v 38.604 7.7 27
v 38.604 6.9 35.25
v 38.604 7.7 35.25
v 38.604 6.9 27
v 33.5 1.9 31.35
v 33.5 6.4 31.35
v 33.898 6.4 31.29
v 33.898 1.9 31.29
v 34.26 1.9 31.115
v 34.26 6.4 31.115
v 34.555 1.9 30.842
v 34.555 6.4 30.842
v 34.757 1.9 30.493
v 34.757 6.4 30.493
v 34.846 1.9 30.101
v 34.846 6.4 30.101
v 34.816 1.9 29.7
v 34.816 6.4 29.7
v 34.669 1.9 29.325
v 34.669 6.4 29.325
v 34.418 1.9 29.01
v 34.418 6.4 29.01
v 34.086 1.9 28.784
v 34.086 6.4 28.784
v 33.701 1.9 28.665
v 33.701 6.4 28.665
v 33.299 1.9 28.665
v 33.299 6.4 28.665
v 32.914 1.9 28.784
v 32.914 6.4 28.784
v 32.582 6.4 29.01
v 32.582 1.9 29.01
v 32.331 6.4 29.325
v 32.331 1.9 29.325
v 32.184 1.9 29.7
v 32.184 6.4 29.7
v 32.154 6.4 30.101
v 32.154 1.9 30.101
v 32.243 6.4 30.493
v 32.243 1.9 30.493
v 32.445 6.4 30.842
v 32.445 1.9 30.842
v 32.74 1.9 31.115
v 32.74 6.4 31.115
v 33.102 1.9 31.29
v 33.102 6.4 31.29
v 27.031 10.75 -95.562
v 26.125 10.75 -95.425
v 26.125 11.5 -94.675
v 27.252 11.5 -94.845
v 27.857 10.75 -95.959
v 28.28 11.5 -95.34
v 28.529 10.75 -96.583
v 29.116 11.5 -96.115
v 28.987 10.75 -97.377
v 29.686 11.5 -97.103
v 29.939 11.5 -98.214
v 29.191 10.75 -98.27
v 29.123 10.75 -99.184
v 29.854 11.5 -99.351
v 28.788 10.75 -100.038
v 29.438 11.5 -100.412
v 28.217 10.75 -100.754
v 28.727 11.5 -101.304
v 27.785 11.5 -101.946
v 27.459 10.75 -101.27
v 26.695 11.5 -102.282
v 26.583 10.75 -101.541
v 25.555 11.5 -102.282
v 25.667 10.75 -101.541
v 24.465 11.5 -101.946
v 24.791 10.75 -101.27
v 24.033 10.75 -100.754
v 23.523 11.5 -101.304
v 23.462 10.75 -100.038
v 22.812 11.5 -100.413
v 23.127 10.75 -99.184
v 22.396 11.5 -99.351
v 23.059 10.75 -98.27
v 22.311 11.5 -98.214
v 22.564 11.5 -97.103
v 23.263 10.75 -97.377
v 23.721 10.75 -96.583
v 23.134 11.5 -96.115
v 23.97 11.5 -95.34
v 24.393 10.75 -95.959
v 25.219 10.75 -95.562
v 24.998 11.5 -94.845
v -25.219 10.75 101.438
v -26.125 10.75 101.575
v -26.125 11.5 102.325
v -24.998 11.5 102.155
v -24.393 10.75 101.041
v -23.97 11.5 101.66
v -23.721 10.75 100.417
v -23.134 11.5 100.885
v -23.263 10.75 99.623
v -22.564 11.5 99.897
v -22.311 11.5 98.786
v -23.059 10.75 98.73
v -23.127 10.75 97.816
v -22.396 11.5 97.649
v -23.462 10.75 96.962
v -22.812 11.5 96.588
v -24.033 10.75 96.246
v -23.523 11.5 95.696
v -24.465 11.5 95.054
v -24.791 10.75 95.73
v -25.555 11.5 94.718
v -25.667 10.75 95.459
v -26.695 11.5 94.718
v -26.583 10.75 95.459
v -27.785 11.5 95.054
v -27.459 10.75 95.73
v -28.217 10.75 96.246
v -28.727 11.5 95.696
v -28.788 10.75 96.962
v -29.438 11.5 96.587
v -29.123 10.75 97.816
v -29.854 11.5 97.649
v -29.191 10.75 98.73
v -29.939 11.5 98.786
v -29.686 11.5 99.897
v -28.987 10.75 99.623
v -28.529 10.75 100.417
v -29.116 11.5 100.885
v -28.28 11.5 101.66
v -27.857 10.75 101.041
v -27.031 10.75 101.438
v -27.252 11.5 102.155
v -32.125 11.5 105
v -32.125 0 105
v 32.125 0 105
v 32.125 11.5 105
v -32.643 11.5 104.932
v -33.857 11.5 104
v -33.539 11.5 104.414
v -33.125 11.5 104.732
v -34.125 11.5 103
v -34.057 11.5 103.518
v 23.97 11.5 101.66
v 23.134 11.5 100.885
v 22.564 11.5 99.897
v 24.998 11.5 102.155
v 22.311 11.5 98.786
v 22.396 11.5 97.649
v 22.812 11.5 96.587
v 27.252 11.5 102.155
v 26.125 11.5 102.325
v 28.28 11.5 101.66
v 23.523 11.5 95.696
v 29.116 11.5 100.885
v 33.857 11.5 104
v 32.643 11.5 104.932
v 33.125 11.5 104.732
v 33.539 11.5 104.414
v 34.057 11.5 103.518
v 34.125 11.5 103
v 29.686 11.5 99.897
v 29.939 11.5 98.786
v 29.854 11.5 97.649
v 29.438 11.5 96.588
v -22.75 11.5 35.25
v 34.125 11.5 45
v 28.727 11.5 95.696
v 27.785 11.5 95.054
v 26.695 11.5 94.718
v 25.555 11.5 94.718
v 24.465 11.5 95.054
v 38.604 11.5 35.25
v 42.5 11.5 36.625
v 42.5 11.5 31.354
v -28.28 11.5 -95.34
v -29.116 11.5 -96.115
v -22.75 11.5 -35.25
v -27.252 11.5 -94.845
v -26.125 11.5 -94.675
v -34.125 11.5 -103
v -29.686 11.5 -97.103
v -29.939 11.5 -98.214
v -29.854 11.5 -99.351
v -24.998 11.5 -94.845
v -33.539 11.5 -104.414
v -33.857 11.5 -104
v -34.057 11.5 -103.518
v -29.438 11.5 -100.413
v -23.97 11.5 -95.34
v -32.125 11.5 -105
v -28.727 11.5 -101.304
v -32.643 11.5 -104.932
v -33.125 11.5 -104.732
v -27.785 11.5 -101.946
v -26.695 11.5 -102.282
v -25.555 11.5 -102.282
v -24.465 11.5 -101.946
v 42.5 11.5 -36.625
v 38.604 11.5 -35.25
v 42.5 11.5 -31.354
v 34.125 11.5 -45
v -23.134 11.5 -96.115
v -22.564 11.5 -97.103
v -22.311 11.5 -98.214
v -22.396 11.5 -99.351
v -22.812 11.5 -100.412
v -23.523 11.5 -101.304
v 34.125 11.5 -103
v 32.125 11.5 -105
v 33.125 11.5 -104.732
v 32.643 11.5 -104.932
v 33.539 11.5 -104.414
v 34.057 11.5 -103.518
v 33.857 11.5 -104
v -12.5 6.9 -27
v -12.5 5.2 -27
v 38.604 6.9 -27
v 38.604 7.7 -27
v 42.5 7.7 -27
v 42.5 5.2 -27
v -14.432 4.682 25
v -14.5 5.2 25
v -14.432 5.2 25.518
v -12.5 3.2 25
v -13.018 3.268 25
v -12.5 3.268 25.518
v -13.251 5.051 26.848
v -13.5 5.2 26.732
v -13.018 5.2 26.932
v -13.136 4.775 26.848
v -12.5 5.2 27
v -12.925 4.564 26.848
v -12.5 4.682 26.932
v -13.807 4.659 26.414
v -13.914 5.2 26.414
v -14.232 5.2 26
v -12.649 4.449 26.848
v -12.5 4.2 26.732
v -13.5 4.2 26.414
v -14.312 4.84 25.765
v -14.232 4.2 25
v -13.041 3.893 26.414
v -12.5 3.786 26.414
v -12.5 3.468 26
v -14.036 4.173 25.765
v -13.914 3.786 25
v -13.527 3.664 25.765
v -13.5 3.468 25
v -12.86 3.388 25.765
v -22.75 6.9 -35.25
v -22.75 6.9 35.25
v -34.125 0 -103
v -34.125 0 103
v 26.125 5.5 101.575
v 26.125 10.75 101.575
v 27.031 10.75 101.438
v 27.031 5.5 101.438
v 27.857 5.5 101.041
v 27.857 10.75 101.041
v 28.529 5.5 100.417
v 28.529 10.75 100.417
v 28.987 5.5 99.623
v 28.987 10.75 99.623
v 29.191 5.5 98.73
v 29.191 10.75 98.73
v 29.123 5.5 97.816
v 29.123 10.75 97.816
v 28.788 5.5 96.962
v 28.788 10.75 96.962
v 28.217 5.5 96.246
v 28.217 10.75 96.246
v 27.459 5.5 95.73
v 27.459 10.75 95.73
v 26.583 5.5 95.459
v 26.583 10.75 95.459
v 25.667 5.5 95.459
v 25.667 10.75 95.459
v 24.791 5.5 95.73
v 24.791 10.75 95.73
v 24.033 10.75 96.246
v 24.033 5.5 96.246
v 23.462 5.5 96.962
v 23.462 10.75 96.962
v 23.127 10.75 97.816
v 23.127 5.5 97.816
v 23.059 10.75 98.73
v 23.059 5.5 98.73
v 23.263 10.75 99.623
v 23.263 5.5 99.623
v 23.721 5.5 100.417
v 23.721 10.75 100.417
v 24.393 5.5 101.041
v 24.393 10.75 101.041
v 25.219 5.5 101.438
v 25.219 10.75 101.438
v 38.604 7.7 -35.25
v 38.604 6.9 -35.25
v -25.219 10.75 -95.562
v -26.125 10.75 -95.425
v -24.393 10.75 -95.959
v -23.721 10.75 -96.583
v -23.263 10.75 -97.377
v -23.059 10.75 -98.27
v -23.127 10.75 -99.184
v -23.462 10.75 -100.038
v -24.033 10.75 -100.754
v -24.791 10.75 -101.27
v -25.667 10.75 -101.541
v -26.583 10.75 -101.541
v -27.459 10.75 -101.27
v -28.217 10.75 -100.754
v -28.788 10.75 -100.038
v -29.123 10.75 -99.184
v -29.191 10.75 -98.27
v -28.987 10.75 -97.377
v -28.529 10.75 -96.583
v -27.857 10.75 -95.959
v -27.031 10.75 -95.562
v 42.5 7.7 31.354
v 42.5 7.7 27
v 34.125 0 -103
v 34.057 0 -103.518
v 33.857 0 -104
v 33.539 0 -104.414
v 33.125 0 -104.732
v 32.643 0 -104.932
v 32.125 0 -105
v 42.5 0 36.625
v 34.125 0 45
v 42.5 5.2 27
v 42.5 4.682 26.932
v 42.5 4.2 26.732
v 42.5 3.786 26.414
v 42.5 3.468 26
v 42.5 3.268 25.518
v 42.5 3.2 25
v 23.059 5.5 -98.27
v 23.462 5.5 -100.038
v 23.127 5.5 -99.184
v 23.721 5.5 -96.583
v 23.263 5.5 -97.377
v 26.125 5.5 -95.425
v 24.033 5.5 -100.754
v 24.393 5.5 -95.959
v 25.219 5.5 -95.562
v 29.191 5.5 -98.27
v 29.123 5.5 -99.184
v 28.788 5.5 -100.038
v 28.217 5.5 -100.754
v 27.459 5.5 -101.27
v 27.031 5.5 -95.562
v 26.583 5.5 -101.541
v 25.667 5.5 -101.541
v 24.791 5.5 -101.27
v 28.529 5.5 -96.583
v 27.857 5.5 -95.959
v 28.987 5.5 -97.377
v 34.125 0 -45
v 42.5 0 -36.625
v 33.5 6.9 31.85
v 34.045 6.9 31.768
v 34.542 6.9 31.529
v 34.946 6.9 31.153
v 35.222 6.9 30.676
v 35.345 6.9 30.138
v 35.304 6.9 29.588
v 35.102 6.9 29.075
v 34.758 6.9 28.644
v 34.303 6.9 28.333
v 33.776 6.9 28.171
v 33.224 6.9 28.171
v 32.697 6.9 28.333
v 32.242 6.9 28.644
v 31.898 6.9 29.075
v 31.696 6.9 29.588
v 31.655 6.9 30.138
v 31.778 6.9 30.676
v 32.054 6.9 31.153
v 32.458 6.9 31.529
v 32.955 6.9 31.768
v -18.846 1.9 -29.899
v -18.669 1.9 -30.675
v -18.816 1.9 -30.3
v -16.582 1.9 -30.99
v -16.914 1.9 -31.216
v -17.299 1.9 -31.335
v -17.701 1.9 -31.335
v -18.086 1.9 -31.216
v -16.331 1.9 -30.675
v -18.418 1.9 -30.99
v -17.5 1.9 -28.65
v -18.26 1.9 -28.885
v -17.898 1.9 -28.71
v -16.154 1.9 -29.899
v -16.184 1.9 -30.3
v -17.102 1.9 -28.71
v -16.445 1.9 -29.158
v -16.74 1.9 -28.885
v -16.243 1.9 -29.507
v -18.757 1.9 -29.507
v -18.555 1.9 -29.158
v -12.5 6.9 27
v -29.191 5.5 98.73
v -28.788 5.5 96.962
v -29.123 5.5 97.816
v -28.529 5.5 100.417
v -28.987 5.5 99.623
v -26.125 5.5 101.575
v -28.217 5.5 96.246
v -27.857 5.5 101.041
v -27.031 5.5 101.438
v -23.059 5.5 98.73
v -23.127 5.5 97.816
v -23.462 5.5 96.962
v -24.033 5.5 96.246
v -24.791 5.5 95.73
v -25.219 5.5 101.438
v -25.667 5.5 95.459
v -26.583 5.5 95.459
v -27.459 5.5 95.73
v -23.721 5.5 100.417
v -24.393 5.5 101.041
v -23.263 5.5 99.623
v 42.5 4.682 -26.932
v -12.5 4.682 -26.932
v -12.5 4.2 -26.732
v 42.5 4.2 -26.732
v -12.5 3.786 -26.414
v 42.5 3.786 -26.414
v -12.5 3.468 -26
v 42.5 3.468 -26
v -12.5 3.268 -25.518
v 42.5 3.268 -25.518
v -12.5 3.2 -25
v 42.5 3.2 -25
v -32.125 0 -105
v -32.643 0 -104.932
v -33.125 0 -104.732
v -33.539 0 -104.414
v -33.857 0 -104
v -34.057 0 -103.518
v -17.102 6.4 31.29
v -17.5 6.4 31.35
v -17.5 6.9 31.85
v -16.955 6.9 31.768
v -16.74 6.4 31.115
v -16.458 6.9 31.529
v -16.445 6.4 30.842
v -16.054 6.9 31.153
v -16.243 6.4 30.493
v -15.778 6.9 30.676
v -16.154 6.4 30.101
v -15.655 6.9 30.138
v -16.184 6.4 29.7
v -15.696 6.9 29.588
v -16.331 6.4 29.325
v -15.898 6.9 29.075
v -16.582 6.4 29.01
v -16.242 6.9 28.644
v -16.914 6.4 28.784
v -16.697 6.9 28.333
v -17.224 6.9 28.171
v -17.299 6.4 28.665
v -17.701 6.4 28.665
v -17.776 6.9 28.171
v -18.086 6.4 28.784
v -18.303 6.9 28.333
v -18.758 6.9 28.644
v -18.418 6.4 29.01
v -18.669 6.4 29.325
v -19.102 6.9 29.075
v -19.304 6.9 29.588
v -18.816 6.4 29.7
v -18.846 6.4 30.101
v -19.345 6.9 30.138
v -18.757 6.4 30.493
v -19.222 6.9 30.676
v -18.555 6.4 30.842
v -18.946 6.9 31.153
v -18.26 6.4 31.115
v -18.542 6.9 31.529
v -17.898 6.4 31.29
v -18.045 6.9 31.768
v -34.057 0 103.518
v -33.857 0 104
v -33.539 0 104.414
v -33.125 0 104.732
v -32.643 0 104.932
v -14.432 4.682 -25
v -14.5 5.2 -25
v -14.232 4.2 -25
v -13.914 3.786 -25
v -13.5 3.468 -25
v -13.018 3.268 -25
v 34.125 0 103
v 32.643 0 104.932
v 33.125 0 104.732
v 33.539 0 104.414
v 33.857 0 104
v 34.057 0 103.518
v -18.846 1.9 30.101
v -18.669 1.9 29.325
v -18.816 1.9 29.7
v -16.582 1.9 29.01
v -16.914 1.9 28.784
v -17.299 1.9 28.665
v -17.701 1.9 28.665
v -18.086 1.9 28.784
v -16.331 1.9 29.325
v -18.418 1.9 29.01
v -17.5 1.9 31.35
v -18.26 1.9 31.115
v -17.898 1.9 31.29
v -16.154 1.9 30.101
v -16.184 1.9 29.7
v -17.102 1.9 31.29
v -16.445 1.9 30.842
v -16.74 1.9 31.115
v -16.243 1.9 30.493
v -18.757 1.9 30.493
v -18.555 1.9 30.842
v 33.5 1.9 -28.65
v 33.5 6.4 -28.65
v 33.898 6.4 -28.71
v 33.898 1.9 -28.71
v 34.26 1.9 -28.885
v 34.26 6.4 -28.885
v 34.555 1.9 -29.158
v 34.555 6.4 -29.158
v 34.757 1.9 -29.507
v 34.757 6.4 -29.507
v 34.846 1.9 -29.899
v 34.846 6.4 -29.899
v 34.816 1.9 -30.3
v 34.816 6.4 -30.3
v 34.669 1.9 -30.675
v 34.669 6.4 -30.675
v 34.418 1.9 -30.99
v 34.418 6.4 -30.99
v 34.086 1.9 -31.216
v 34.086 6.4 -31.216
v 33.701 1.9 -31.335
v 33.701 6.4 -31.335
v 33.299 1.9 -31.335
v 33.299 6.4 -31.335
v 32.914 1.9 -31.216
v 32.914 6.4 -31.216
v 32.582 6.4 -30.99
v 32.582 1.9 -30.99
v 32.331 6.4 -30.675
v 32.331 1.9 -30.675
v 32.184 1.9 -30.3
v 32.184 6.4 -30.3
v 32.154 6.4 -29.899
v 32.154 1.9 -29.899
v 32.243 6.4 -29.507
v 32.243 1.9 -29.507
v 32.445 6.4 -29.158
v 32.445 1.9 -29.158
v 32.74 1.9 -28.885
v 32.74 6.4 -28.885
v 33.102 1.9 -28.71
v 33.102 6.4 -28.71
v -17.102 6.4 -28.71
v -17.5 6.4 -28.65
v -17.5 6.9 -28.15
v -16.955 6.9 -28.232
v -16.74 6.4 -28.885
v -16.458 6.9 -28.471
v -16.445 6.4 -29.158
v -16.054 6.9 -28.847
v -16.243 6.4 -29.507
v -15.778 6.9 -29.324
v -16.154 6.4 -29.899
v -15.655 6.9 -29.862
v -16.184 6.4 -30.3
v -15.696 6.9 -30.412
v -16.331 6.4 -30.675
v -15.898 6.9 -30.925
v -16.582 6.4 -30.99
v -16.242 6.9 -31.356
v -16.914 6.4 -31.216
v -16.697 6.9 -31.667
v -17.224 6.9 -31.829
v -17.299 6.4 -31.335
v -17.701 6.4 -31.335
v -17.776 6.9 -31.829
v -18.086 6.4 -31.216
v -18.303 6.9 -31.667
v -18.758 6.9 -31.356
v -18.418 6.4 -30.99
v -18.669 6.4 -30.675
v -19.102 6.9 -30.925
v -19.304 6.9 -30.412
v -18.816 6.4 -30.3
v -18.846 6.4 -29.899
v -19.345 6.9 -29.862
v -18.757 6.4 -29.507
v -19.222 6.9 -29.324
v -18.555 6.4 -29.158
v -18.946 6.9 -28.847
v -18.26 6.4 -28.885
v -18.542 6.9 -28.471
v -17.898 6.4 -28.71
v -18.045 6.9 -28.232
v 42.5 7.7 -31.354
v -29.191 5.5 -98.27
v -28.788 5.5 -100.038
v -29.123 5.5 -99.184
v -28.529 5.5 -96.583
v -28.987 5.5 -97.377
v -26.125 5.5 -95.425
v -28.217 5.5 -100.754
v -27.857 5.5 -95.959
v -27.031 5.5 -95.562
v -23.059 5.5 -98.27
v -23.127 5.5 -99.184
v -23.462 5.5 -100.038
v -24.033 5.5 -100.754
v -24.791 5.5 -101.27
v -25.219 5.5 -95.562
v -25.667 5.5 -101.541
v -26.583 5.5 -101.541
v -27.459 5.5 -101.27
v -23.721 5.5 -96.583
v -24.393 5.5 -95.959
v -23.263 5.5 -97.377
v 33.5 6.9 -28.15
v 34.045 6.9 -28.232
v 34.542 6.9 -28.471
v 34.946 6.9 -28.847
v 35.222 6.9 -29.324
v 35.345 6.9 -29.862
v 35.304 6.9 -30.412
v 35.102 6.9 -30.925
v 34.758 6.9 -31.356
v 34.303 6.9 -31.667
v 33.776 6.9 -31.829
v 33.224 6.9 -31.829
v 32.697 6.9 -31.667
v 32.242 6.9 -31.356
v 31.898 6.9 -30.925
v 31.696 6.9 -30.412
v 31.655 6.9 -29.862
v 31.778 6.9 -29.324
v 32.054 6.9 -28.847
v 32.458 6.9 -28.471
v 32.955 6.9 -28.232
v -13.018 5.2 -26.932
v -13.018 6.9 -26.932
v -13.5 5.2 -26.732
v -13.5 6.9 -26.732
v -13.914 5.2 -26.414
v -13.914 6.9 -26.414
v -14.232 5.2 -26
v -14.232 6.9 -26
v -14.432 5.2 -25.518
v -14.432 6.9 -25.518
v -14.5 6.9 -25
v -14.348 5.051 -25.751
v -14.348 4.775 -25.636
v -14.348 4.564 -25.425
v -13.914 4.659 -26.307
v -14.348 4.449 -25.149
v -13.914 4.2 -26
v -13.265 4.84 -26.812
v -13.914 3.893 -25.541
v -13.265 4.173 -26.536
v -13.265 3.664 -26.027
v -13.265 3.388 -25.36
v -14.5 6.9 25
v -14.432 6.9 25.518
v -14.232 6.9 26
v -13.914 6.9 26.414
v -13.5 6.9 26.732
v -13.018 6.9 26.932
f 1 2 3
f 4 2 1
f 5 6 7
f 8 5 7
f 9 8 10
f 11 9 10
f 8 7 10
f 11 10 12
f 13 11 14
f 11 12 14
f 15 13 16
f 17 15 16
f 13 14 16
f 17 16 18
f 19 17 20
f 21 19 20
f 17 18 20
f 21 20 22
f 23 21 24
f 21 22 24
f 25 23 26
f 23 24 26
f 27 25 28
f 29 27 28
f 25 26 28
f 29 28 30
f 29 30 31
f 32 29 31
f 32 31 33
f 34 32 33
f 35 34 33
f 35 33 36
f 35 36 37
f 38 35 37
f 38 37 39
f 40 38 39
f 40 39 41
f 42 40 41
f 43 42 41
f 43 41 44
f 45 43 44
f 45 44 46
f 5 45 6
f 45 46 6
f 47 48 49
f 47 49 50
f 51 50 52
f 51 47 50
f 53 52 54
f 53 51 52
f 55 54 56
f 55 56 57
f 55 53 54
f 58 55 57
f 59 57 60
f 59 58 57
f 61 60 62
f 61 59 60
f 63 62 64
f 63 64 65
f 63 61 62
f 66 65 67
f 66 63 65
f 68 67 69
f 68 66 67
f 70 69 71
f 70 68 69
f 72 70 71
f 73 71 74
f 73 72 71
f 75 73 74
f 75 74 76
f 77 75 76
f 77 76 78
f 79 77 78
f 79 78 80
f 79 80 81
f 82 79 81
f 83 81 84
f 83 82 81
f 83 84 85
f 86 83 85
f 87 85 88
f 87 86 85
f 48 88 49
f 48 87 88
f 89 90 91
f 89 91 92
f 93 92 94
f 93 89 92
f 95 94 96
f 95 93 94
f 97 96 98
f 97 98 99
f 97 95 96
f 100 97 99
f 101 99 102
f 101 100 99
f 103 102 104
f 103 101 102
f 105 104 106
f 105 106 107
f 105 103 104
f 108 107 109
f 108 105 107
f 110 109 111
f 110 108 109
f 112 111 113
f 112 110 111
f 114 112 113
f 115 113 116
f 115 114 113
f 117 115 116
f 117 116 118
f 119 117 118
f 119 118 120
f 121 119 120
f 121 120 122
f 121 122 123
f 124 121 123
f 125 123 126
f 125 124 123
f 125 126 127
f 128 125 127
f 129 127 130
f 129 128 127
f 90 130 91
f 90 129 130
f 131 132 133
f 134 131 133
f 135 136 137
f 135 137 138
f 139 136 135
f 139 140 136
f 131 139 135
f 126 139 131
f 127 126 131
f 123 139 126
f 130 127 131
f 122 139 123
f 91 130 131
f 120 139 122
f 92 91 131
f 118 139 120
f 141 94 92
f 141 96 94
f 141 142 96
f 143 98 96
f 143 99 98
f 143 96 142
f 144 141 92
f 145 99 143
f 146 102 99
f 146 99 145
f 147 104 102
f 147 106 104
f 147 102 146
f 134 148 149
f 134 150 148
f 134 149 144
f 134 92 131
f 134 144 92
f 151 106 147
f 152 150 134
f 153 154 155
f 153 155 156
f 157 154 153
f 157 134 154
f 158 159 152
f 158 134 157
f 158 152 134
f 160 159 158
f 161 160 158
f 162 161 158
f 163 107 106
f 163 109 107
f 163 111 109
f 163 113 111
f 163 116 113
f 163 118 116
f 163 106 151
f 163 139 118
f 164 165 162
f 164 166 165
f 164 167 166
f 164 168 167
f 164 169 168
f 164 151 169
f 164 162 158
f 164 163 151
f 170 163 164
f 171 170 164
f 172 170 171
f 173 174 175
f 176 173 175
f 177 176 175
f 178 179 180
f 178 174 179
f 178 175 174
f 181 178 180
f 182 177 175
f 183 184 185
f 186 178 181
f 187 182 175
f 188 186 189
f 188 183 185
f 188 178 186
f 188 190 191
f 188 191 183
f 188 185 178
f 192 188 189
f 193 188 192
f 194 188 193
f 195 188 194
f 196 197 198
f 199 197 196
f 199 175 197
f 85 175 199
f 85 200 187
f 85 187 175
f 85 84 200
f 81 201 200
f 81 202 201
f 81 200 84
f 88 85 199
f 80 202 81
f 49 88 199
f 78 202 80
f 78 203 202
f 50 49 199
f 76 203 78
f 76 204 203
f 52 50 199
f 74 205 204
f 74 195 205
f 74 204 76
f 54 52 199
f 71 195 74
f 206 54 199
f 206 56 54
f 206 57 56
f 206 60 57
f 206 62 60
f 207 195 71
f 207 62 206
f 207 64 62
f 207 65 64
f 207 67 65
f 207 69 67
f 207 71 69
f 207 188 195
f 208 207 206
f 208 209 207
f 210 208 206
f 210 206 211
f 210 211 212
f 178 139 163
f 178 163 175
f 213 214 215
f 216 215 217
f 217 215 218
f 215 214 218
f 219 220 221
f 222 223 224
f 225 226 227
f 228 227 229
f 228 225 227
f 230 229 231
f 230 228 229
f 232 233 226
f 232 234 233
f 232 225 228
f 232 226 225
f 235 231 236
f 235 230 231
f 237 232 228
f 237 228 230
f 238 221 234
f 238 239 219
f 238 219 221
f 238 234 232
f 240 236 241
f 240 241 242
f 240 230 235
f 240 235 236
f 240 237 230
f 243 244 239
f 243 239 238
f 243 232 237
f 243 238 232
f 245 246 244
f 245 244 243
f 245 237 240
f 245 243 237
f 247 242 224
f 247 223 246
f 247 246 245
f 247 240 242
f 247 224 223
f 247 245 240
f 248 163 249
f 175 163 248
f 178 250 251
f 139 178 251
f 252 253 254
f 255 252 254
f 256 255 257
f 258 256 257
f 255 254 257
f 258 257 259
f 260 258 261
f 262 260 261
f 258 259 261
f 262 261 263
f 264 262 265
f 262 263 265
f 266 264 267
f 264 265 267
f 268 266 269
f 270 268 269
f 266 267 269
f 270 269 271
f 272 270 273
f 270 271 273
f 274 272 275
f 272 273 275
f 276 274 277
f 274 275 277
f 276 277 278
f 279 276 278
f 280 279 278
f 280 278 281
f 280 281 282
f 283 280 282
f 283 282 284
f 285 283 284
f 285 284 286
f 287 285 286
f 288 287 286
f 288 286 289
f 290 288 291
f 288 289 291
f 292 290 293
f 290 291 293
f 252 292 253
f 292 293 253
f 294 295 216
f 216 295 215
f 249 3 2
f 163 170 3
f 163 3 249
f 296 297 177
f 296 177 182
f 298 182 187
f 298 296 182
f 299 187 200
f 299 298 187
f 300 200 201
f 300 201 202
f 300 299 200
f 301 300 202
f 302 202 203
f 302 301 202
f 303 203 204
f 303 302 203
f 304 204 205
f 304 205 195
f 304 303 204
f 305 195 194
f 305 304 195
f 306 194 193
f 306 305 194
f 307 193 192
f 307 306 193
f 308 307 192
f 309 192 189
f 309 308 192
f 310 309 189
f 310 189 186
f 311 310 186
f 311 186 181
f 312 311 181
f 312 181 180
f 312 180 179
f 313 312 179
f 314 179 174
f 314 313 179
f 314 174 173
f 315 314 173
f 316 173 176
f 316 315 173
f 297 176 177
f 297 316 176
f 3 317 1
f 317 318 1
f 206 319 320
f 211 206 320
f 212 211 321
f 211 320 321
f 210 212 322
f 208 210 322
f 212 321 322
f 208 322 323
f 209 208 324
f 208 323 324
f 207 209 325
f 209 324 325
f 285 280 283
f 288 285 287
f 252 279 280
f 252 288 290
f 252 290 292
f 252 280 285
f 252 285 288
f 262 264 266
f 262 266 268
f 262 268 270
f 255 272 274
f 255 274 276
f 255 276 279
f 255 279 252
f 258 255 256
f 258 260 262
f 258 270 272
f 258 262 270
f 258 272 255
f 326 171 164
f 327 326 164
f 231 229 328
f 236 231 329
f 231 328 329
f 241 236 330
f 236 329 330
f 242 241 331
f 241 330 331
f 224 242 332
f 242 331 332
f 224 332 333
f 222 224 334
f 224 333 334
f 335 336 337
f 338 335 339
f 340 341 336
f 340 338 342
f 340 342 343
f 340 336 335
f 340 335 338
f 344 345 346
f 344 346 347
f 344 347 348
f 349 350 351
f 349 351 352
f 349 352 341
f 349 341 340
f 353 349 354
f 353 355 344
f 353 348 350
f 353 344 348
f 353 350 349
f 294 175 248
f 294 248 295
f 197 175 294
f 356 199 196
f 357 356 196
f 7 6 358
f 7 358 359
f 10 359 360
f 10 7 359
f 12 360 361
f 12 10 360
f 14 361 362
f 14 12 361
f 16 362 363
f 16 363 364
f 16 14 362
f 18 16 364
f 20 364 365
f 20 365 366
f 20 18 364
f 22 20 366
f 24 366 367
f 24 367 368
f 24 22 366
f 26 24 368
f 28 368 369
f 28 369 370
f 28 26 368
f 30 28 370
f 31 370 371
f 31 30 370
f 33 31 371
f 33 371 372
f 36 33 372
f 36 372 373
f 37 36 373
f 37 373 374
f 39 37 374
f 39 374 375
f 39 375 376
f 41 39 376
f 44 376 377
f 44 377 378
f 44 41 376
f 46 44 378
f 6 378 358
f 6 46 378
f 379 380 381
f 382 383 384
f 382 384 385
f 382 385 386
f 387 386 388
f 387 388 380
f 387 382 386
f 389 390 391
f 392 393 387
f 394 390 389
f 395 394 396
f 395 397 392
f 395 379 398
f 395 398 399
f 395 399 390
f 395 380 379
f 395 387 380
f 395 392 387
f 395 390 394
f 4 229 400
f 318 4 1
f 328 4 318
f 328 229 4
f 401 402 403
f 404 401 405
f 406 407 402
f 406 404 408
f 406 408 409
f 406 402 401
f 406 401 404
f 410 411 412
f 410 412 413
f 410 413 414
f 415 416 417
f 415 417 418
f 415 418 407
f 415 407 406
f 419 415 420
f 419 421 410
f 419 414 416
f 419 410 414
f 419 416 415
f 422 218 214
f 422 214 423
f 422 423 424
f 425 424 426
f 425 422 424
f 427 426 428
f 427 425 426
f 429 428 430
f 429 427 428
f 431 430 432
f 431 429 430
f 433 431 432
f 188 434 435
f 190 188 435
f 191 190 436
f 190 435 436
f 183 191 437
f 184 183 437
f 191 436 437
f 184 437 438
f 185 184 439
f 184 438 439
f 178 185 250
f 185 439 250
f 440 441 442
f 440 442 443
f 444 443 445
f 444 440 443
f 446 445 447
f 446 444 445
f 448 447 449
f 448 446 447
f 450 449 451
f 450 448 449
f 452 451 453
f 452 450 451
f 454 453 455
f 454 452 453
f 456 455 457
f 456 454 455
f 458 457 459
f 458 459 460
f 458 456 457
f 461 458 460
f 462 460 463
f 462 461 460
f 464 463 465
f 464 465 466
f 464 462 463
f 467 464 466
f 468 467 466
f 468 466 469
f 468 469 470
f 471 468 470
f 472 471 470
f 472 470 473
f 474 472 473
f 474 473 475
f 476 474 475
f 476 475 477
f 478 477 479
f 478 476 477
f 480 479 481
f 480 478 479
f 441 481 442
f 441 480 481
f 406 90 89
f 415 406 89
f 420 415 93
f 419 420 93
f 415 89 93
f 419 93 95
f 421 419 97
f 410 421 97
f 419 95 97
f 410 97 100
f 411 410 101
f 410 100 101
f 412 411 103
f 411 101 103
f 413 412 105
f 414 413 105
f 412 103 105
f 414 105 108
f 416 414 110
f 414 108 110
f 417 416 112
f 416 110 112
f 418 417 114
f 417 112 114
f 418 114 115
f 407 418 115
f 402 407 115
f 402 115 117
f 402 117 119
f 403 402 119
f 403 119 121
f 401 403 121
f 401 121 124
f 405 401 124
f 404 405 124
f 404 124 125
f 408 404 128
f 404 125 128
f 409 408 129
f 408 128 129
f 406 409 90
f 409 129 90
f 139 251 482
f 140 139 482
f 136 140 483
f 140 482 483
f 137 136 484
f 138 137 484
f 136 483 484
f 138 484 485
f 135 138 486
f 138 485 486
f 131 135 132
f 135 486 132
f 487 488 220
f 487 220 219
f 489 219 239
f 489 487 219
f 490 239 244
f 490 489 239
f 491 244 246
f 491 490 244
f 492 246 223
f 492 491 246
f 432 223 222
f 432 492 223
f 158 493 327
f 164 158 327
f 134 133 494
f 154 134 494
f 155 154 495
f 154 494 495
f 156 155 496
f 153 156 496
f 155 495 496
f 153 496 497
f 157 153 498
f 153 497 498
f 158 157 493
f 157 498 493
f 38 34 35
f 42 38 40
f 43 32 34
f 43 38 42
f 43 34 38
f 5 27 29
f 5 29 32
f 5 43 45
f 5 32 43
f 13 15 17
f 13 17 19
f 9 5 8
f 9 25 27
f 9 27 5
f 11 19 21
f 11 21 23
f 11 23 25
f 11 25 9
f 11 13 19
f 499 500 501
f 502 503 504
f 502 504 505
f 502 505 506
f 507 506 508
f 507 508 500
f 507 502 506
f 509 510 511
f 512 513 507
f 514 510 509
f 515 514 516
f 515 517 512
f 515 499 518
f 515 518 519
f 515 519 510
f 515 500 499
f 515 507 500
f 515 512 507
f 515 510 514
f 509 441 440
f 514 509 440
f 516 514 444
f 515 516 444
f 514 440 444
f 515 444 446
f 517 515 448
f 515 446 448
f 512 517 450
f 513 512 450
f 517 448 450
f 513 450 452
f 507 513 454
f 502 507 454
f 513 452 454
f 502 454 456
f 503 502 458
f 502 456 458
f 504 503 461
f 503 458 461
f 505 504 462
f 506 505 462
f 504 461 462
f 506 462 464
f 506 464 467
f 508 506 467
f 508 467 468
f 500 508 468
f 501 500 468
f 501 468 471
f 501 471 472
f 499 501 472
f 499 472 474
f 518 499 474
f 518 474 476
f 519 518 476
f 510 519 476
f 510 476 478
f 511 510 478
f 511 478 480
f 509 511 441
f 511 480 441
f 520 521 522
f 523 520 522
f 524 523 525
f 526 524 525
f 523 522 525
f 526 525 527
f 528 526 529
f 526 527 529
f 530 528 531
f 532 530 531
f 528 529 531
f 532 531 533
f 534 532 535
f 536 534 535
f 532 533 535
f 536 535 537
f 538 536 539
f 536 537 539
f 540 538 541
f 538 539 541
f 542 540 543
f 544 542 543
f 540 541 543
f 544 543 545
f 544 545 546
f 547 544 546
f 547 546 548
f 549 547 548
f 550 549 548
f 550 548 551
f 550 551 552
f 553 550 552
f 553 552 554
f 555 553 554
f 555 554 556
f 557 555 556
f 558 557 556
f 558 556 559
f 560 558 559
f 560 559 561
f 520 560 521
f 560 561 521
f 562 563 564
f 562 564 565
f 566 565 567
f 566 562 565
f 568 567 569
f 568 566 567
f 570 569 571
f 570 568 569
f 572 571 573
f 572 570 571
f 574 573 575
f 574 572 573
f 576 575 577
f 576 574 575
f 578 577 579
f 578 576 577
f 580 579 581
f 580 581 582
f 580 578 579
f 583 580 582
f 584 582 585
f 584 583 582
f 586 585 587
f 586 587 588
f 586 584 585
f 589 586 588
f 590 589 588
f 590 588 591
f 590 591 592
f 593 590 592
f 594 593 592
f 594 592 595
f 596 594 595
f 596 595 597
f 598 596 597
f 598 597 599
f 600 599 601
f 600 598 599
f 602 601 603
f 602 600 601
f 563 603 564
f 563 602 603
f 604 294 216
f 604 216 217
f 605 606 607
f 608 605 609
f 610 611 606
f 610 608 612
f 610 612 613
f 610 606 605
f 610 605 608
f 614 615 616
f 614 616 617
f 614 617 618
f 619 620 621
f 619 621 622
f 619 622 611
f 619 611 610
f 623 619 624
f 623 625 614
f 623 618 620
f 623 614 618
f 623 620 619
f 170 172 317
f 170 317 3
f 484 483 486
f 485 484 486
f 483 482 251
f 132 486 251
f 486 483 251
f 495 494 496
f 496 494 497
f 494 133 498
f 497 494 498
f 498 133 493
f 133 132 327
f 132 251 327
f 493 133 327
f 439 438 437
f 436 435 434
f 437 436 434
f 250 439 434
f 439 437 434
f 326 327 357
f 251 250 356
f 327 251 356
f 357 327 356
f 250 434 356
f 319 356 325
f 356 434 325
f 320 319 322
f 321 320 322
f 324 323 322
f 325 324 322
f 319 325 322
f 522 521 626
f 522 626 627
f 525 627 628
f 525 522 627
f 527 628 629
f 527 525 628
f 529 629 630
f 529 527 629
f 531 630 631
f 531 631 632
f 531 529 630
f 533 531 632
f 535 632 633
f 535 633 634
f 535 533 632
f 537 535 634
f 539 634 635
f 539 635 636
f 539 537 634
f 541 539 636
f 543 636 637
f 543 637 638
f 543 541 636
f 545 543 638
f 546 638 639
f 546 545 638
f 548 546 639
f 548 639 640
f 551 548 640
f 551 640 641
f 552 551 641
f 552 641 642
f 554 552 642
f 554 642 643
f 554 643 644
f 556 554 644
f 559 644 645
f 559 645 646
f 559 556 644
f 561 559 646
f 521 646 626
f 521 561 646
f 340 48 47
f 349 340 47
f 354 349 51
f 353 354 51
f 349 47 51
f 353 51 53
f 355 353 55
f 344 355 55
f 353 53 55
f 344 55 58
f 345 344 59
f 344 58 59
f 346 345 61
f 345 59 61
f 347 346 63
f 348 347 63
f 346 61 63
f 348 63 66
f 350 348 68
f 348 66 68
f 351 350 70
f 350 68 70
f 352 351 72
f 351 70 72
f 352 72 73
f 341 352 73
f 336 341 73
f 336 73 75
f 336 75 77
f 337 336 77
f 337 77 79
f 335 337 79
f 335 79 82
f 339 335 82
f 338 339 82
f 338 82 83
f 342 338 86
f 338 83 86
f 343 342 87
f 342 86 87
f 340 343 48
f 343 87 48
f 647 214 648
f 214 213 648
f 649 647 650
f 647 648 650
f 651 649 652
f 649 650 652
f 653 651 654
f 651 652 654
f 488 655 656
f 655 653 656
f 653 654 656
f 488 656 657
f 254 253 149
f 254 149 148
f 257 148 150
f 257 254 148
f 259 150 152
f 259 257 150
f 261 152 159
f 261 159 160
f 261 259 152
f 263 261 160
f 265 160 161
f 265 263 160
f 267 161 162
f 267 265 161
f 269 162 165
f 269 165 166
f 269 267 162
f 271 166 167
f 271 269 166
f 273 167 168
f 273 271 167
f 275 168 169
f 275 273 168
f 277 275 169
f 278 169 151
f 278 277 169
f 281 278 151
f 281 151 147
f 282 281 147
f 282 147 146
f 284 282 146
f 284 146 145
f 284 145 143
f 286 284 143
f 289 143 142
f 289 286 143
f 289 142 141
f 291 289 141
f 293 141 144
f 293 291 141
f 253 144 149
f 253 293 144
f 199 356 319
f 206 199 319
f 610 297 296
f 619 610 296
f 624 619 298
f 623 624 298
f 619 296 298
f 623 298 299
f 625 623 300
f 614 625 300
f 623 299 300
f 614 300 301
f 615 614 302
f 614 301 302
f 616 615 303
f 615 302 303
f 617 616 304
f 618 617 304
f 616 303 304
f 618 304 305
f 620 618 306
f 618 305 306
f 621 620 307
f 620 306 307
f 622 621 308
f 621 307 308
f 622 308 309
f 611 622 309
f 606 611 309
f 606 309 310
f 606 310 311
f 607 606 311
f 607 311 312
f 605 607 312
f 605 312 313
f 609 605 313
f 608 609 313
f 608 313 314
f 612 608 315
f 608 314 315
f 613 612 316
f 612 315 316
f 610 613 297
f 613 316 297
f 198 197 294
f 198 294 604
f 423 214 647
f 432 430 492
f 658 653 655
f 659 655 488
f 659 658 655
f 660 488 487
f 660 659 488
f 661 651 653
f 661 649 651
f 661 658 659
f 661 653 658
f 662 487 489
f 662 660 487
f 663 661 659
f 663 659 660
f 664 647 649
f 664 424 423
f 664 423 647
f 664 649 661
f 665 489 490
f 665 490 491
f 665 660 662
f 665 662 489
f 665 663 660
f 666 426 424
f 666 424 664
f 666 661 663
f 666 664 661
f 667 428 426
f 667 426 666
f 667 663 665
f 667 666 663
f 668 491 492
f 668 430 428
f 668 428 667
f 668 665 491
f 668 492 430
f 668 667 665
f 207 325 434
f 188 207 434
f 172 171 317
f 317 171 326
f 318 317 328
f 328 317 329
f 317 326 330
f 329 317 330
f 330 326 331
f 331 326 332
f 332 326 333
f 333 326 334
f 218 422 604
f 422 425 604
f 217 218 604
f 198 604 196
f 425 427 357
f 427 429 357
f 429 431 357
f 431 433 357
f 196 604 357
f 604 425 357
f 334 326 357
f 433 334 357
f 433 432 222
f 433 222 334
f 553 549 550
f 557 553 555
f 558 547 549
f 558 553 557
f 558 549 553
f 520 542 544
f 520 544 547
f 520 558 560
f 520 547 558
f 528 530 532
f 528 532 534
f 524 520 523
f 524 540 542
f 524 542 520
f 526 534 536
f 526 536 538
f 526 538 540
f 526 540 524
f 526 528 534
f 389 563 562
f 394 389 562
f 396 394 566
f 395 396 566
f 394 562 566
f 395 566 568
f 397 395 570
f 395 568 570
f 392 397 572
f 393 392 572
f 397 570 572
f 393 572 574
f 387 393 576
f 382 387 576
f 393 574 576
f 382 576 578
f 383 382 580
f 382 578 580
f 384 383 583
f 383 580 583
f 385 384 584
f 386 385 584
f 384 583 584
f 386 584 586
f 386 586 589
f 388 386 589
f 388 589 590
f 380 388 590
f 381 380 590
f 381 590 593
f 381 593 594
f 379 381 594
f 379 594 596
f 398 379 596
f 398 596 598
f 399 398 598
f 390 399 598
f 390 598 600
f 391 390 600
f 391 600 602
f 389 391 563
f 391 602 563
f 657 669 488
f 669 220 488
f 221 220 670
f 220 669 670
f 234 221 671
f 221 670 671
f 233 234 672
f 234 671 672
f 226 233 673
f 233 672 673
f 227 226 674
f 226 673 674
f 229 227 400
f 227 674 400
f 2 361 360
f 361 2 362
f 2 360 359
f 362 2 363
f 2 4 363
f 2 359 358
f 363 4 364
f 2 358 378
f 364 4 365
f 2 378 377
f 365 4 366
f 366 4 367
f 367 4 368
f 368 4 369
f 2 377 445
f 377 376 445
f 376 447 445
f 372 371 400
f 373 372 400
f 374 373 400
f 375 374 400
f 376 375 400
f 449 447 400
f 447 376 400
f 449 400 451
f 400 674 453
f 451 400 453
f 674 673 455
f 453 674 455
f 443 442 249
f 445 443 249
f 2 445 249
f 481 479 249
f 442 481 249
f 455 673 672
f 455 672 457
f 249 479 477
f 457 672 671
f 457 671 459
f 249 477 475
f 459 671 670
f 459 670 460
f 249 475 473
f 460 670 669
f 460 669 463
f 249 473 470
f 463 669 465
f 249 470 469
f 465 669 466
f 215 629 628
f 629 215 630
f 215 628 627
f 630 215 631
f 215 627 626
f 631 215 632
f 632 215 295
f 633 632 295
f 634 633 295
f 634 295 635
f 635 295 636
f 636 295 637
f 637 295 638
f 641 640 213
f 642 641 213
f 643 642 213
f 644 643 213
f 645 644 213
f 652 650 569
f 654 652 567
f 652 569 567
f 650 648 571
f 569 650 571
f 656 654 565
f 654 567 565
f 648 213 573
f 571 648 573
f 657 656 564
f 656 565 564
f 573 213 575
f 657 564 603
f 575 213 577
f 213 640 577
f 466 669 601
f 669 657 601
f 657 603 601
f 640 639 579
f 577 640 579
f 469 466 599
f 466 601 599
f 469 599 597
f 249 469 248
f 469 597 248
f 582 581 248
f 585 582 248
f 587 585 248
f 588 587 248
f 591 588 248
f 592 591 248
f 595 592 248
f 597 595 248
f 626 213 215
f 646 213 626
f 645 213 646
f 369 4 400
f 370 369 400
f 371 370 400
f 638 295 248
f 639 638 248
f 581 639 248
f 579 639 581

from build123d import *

# Parameters (mm, degrees)
BOSS_EXTRUDE1_DEPTH     = 11.5
SKETCH4_R               = 3.075
CUT_EXTRUDE1_DEPTH      = 6
BOSS_EXTRUDE3_DEPTH     = 11.5
CUT_EXTRUDE6_DEPTH      = 4.6
CUT_EXTRUDE3_DEPTH      = 114.485065097
CUT_EXTRUDE3_DEPTH_BACK = 3.7
SKETCH24_W              = 57
SKETCH24_H              = 54
SKETCH25_R              = 1.35
CUT_EXTRUDE4_DEPTH      = 5
CHAMFER4_SIZE           = 0.5
FILLET1_R               = 2
BOSS_EXTRUDE2_DEPTH     = 0.8
CHAMFER5_SIZE           = 0.75


with BuildPart() as part:
    # Sketch1 → Boss-Extrude1 (new body)
    with BuildSketch(Plane(origin=(0, 0, 0), x_dir=(1, 0, 0), z_dir=(0, 1, 0))):
        with BuildLine():
            Line((-34.125, 90), (-34.125, -90))
            Line((-34.125, -90), (-34.125, -103))
            ThreePointArc((-34.125, -103), (-33.539213562, -104.414213562), (-32.125, -105))
            Line((-32.125, -105), (32.125, -105))
            ThreePointArc((32.125, -105), (33.539213562, -104.414213562), (34.125, -103))
            Line((34.125, -103), (34.125, -90))
            Line((34.125, -90), (34.125, 90))
            Line((34.125, 90), (34.125, 103))
            ThreePointArc((34.125, 103), (33.539213562, 104.414213562), (32.125, 105))
            Line((32.125, 105), (-32.125, 105))
            ThreePointArc((-32.125, 105), (-33.539213562, 104.414213562), (-34.125, 103))
            Line((-34.125, 103), (-34.125, 90))
        make_face()
    extrude(amount=BOSS_EXTRUDE1_DEPTH)

    # Sketch4 → Cut-Extrude1 (cut)
    with BuildSketch(Plane(origin=(0, 11.5, 0), x_dir=(1, 0, 0), z_dir=(0, 1, 0))):
        with Locations(Location((-26.125, -98.5, 0), (0, 0, 270))):
            Circle(SKETCH4_R)
        with Locations(Location((26.125, -98.5, 0), (0, 0, 270))):
            Circle(SKETCH4_R)
        with Locations(Location((26.125, 98.5, 0), (0, 0, 270))):
            Circle(SKETCH4_R)
        with Locations(Location((-26.125, 98.5, 0), (0, 0, 270))):
            Circle(SKETCH4_R)
    extrude(amount=-CUT_EXTRUDE1_DEPTH, mode=Mode.SUBTRACT)

    # Sketch27 → Boss-Extrude3 (add)
    with BuildSketch(Plane(origin=(0, 11.5, 0), x_dir=(1, 0, 0), z_dir=(0, 1, 0))):
        Polygon((34.125, 45), (42.5, 36.625), (42.5, -36.625), (34.125, -45), align=None)
    extrude(amount=-BOSS_EXTRUDE3_DEPTH)

    # Sketch21 → Cut-Extrude6 (cut)
    with BuildSketch(Plane(origin=(0, 11.5, 0), x_dir=(1, 0, 0), z_dir=(0, 1, 0))):
        Polygon((42.5, 31.353553391), (42.5, -31.353553391), (38.603553391, -35.25), (-22.75, -35.25), (-22.75, 35.25), (38.603553391, 35.25), align=None)
    extrude(amount=-CUT_EXTRUDE6_DEPTH, mode=Mode.SUBTRACT)

    # Sketch24 → Cut-Extrude3 (cut, two sides: drawn at the far end of the back side and taken through both)
    with BuildSketch(Plane(origin=(0, 6.9, 0), x_dir=(1, 0, 0), z_dir=(0, 1, 0)).offset(-CUT_EXTRUDE3_DEPTH_BACK)):
        with Locations((14, 0)):
            Rectangle(SKETCH24_W, SKETCH24_H)
    extrude(amount=CUT_EXTRUDE3_DEPTH + CUT_EXTRUDE3_DEPTH_BACK, mode=Mode.SUBTRACT)

    # Sketch25 → Cut-Extrude4 (cut)
    with BuildSketch(Plane(origin=(0, 6.9, 0), x_dir=(1, 0, 0), z_dir=(0, 1, 0))):
        with Locations(Location((33.5, 30, 0), (0, 0, 270))):
            Circle(SKETCH25_R)
        with Locations(Location((-17.5, 30, 0), (0, 0, 270))):
            Circle(SKETCH25_R)
        with Locations(Location((33.5, -30, 0), (0, 0, 270))):
            Circle(SKETCH25_R)
        with Locations(Location((-17.5, -30, 0), (0, 0, 270))):
            Circle(SKETCH25_R)
    extrude(amount=-CUT_EXTRUDE4_DEPTH, mode=Mode.SUBTRACT)

    # Chamfer4
    chamfer4_edges = [part.edges().sort_by_distance(p)[0] for p in [
        (-17.5, 6.9, -31.35),
        (33.5, 6.9, 28.65),
        (-17.5, 6.9, 28.65),
        (33.5, 6.9, -31.35),
    ]]
    chamfer(chamfer4_edges, length=CHAMFER4_SIZE)

    # Fillet1
    fillet1_edges = [part.edges().sort_by_distance(p)[0] for p in [
        (14, 3.2, -27),
        (-14.5, 5.05, -27),
        (-14.5, 3.2, 0),
        (-14.5, 5.05, 27),
        (14, 3.2, 27),
    ]]
    fillet(fillet1_edges, radius=FILLET1_R)

    # Sketch26 → Boss-Extrude2 (add)
    with BuildSketch(Plane(origin=(0, 6.9, 0), x_dir=(1, 0, 0), z_dir=(0, 1, 0))):
        Polygon((38.603553391, 35.25), (38.603553391, 27), (42.5, 27), (42.5, 31.353553391), align=None)
        Polygon((42.5, -31.353553391), (38.603553391, -35.25), (38.603553391, -27), (42.5, -27), align=None)
    extrude(amount=BOSS_EXTRUDE2_DEPTH)

    # Chamfer5
    chamfer5_edges = [part.edges().sort_by_distance(p)[0] for p in [
        (-26.125, 11.5, -101.575),
        (26.125, 11.5, -101.575),
        (26.125, 11.5, 95.425),
        (-26.125, 11.5, 95.425),
    ]]
    chamfer(chamfer5_edges, length=CHAMFER5_SIZE)


solid = part.part
